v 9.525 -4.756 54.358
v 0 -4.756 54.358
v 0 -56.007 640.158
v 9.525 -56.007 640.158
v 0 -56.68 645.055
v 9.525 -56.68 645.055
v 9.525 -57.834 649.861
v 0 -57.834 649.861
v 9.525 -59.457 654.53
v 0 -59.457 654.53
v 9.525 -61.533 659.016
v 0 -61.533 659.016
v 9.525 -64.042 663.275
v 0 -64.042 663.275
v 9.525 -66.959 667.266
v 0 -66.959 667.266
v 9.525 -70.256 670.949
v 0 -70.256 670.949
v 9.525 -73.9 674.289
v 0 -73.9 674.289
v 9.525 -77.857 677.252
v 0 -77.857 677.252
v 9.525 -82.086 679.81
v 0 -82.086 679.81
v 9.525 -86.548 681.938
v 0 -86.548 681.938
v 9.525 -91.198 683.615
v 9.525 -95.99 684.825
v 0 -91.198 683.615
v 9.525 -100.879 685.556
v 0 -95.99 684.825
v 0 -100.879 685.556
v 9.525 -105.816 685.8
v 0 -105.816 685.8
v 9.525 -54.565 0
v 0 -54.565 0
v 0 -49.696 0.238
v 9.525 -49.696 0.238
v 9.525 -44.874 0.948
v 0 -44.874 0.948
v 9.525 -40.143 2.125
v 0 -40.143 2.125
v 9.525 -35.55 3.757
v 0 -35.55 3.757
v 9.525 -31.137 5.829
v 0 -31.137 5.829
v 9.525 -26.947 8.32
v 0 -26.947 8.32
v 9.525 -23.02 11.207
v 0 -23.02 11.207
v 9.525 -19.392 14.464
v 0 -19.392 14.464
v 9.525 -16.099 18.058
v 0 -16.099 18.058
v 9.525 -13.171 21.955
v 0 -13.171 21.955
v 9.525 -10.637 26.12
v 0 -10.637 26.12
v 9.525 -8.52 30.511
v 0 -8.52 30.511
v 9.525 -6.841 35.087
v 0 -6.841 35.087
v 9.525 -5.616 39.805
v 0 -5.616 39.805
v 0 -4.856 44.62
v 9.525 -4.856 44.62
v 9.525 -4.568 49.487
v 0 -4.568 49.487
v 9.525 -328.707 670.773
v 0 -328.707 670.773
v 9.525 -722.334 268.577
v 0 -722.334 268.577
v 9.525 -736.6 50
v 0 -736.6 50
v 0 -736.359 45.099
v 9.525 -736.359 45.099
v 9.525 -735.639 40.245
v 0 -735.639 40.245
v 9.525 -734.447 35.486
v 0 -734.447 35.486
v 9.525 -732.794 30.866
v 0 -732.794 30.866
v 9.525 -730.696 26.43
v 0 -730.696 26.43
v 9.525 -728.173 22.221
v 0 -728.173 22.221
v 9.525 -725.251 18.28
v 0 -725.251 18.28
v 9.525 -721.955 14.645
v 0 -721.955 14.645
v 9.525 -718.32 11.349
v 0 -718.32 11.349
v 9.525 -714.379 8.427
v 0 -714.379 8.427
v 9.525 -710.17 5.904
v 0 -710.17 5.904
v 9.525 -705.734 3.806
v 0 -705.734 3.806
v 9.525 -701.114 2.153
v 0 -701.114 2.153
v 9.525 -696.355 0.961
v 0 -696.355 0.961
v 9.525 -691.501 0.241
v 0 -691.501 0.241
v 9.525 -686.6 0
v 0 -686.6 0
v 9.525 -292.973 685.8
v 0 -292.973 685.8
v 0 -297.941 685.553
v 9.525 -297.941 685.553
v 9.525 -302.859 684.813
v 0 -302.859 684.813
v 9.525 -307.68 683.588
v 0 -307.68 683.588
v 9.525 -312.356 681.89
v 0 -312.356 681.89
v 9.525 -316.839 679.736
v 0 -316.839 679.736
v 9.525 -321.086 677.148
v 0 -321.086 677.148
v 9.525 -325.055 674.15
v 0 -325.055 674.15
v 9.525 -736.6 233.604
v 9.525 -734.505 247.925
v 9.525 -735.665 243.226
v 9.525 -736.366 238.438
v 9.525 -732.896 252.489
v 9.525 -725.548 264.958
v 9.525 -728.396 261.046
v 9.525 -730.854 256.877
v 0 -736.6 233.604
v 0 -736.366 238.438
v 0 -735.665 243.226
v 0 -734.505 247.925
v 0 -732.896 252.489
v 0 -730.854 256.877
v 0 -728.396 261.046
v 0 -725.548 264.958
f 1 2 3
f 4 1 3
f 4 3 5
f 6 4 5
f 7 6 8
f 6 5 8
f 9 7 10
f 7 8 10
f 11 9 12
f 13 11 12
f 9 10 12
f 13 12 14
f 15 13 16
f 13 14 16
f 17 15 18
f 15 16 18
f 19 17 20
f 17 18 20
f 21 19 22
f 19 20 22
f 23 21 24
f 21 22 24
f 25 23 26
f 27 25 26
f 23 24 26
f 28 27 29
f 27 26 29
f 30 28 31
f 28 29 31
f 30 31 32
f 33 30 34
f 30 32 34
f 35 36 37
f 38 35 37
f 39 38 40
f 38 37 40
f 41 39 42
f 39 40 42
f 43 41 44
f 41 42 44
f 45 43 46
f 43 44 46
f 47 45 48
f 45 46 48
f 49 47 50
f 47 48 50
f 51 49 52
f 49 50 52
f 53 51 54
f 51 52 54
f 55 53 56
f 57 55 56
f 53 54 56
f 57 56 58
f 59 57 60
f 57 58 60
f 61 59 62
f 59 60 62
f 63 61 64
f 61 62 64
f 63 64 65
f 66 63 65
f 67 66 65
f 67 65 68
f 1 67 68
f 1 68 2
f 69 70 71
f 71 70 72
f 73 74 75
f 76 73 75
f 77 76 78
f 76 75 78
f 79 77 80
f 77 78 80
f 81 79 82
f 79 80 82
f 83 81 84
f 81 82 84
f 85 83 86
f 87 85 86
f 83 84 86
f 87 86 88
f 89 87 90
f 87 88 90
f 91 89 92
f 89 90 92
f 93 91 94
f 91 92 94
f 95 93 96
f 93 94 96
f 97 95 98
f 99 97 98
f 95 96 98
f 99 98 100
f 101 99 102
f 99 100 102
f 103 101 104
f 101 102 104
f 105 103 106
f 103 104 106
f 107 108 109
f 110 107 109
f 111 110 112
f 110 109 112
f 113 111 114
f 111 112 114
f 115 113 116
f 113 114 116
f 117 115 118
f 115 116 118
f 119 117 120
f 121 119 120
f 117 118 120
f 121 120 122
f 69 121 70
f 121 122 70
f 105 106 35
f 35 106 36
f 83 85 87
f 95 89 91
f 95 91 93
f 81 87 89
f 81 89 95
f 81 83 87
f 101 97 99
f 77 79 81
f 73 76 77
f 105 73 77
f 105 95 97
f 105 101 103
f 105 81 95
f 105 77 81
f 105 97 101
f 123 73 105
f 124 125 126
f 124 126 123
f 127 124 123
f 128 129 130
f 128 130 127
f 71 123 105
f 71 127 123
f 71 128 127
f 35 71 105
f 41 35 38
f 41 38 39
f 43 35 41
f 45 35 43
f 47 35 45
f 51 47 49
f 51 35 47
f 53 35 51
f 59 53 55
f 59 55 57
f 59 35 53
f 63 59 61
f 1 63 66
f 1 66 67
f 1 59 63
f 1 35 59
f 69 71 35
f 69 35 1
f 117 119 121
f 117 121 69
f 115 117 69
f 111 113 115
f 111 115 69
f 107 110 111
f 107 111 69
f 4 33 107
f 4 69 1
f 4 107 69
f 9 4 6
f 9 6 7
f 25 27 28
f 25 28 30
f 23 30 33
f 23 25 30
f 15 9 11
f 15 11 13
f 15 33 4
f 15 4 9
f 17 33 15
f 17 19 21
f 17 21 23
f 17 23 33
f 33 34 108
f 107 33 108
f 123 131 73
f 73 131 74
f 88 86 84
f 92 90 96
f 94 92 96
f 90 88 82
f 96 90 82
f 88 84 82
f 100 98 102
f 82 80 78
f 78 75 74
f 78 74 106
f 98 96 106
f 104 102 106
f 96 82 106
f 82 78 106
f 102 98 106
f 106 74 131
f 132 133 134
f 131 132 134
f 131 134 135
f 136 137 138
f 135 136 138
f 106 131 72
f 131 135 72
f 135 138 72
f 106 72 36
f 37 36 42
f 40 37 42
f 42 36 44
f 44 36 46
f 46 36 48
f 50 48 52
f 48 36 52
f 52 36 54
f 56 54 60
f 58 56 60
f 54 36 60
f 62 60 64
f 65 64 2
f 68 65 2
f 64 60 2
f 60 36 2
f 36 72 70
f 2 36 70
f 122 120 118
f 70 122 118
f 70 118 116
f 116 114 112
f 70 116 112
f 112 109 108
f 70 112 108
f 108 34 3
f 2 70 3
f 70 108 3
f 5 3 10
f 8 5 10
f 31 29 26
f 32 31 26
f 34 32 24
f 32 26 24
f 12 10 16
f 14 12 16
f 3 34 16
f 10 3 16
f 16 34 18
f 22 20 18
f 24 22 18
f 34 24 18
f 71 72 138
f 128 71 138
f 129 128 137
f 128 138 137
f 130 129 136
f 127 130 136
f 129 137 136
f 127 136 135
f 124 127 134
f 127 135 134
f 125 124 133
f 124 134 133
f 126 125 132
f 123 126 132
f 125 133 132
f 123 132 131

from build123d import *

# Parameters (mm, degrees)
F1_DEPTH = 9.525


with BuildPart() as f1:
    # F0 (on Right) → F1 (new body)
    with BuildSketch(Plane.YZ):
        with BuildLine():
            Line((-686.6, 0), (-54.565425, 0))
            ThreePointArc((-54.565425, 0), (-17.701558, 16.22049), (-4.75569, 54.357787))
            Line((-4.75569, 54.357787), (-56.006549, 640.157787))
            ThreePointArc((-56.006549, 640.157787), (-72.036774, 672.663867), (-105.816284, 685.8))
            Line((-105.816284, 685.8), (-292.97298, 685.8))
            ThreePointArc((-292.97298, 685.8), (-312.355559, 681.890298), (-328.706935, 670.772624))
            Line((-328.706935, 670.772624), (-722.333955, 268.576607))
            ThreePointArc((-722.333955, 268.576607), (-732.896316, 252.489192), (-736.6, 233.603983))
            Line((-736.6, 233.603983), (-736.6, 50))
            ThreePointArc((-736.6, 50), (-721.955339, 14.644661), (-686.6, 0))
        make_face()
    extrude(amount=F1_DEPTH)


solid = f1.part
